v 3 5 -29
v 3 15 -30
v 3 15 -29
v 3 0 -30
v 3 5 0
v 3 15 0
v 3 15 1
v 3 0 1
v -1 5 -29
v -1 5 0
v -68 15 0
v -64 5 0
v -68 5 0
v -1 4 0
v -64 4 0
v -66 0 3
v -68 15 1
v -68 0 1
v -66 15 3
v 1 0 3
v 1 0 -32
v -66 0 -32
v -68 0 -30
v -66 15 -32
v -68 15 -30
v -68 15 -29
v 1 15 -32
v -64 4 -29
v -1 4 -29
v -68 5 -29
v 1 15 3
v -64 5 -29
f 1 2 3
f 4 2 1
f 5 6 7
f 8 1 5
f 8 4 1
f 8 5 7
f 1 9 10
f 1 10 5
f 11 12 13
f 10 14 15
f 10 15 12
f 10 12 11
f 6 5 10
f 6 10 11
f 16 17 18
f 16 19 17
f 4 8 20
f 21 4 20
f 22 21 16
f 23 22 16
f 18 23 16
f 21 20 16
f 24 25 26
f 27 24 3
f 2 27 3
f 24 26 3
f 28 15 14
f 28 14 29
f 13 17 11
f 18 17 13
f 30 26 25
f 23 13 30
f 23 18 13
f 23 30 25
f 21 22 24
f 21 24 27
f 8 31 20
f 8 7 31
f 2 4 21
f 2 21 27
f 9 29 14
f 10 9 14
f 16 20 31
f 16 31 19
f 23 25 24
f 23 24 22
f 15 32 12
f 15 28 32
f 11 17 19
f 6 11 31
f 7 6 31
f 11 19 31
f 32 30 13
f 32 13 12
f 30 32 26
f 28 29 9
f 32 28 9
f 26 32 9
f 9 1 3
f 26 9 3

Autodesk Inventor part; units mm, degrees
ref_plane "YZ Plane" through (0, 0, 0) normal (1, 0, 0) x (0, 1, 0)
ref_plane "XZ Plane" through (0, 0, 0) normal (0, 1, 0) x (-1, 0, 0)
ref_plane "XY Plane" through (0, 0, 0) normal (0, 0, 1) x (1, 0, 0)
sketch "Sketch1" plane through (0, 0, 0) normal (0, 1, 0) x (-1, 0, 0)
  line L0 (0, 0) -> (0, -29)
  line L1 (0, 0) -> (65, 0)
  line L2 (65, 0) -> (65, -29)
  line L3 (65, -29) -> (0, -29)
  dimension "d0" = 29
  dimension "d1" = 65
extrude "Extrusion1" add sketch "Sketch1" along normal blind 4
sketch "Sketch3" plane through (0, 0, 0) normal (0, -1, 0) x (1, 0, 0)
  line L0 (0, 0) -> (0, -29) projected
  line L1 (-65, 0) -> (0, 0) projected
  line L2 (-65, -29) -> (-65, 0) projected
  line L3 (0, -29) -> (-65, -29) projected
  line L4 (3, -32) -> (3, 3)
  line L5 (3, 3) -> (-68, 3)
  line L6 (-68, 3) -> (-68, -32)
  line L7 (-68, -32) -> (3, -32)
  dimension "d4" = 3
extrude "Extrusion2" add sketch "Sketch3" against normal blind 15
sketch "Sketch4" plane through (3, 0, 3) normal (1, 0, 0) x (0, 0, -1)
  line L0 (3, 4) -> (32, 4) projected
  line L1 (32, 4) -> (3, 4) projected
  line L2 (3, 4) -> (3, 15)
  line L3 (32, 4) -> (32, 15)
  line L4 (3, 4) -> (32, 4)
  line L5 (3, 15) -> (32, 15)
  line L6 (0, 15) -> (35, 15) projected
  point P0 (3, 0)
extrude "Extrusion3" cut sketch "Sketch4" against normal blind 72.15
chamfer "Chamfer1" distance 2 angle 45 4 edges at (3, 7.5, 3) (-68, 7.5, 3) (-68, 7.5, -32) (3, 7.5, -32)
sketch "Sketch5" plane through (0, 4, 0) normal (0, 1, 0) x (1, 0, 0)
  line L0 (-68, 0) -> (-68, 29) projected
  line L1 (3, 29) -> (3, 0) projected
  line L2 (-68, 29) -> (3, 29) projected
  line L3 (-1, 29) -> (-1, 0)
  line L4 (-64, 29) -> (-64, 0)
  line L5 (3, 0) -> (-68, 0) projected
  point P0 (0, 0)
extrude "Extrusion4" add sketch "Sketch5" along normal blind 1 contours L0 L2 L4 L5 | L3 L2 L1 L5
properties part number "Buck Converter Holder"
